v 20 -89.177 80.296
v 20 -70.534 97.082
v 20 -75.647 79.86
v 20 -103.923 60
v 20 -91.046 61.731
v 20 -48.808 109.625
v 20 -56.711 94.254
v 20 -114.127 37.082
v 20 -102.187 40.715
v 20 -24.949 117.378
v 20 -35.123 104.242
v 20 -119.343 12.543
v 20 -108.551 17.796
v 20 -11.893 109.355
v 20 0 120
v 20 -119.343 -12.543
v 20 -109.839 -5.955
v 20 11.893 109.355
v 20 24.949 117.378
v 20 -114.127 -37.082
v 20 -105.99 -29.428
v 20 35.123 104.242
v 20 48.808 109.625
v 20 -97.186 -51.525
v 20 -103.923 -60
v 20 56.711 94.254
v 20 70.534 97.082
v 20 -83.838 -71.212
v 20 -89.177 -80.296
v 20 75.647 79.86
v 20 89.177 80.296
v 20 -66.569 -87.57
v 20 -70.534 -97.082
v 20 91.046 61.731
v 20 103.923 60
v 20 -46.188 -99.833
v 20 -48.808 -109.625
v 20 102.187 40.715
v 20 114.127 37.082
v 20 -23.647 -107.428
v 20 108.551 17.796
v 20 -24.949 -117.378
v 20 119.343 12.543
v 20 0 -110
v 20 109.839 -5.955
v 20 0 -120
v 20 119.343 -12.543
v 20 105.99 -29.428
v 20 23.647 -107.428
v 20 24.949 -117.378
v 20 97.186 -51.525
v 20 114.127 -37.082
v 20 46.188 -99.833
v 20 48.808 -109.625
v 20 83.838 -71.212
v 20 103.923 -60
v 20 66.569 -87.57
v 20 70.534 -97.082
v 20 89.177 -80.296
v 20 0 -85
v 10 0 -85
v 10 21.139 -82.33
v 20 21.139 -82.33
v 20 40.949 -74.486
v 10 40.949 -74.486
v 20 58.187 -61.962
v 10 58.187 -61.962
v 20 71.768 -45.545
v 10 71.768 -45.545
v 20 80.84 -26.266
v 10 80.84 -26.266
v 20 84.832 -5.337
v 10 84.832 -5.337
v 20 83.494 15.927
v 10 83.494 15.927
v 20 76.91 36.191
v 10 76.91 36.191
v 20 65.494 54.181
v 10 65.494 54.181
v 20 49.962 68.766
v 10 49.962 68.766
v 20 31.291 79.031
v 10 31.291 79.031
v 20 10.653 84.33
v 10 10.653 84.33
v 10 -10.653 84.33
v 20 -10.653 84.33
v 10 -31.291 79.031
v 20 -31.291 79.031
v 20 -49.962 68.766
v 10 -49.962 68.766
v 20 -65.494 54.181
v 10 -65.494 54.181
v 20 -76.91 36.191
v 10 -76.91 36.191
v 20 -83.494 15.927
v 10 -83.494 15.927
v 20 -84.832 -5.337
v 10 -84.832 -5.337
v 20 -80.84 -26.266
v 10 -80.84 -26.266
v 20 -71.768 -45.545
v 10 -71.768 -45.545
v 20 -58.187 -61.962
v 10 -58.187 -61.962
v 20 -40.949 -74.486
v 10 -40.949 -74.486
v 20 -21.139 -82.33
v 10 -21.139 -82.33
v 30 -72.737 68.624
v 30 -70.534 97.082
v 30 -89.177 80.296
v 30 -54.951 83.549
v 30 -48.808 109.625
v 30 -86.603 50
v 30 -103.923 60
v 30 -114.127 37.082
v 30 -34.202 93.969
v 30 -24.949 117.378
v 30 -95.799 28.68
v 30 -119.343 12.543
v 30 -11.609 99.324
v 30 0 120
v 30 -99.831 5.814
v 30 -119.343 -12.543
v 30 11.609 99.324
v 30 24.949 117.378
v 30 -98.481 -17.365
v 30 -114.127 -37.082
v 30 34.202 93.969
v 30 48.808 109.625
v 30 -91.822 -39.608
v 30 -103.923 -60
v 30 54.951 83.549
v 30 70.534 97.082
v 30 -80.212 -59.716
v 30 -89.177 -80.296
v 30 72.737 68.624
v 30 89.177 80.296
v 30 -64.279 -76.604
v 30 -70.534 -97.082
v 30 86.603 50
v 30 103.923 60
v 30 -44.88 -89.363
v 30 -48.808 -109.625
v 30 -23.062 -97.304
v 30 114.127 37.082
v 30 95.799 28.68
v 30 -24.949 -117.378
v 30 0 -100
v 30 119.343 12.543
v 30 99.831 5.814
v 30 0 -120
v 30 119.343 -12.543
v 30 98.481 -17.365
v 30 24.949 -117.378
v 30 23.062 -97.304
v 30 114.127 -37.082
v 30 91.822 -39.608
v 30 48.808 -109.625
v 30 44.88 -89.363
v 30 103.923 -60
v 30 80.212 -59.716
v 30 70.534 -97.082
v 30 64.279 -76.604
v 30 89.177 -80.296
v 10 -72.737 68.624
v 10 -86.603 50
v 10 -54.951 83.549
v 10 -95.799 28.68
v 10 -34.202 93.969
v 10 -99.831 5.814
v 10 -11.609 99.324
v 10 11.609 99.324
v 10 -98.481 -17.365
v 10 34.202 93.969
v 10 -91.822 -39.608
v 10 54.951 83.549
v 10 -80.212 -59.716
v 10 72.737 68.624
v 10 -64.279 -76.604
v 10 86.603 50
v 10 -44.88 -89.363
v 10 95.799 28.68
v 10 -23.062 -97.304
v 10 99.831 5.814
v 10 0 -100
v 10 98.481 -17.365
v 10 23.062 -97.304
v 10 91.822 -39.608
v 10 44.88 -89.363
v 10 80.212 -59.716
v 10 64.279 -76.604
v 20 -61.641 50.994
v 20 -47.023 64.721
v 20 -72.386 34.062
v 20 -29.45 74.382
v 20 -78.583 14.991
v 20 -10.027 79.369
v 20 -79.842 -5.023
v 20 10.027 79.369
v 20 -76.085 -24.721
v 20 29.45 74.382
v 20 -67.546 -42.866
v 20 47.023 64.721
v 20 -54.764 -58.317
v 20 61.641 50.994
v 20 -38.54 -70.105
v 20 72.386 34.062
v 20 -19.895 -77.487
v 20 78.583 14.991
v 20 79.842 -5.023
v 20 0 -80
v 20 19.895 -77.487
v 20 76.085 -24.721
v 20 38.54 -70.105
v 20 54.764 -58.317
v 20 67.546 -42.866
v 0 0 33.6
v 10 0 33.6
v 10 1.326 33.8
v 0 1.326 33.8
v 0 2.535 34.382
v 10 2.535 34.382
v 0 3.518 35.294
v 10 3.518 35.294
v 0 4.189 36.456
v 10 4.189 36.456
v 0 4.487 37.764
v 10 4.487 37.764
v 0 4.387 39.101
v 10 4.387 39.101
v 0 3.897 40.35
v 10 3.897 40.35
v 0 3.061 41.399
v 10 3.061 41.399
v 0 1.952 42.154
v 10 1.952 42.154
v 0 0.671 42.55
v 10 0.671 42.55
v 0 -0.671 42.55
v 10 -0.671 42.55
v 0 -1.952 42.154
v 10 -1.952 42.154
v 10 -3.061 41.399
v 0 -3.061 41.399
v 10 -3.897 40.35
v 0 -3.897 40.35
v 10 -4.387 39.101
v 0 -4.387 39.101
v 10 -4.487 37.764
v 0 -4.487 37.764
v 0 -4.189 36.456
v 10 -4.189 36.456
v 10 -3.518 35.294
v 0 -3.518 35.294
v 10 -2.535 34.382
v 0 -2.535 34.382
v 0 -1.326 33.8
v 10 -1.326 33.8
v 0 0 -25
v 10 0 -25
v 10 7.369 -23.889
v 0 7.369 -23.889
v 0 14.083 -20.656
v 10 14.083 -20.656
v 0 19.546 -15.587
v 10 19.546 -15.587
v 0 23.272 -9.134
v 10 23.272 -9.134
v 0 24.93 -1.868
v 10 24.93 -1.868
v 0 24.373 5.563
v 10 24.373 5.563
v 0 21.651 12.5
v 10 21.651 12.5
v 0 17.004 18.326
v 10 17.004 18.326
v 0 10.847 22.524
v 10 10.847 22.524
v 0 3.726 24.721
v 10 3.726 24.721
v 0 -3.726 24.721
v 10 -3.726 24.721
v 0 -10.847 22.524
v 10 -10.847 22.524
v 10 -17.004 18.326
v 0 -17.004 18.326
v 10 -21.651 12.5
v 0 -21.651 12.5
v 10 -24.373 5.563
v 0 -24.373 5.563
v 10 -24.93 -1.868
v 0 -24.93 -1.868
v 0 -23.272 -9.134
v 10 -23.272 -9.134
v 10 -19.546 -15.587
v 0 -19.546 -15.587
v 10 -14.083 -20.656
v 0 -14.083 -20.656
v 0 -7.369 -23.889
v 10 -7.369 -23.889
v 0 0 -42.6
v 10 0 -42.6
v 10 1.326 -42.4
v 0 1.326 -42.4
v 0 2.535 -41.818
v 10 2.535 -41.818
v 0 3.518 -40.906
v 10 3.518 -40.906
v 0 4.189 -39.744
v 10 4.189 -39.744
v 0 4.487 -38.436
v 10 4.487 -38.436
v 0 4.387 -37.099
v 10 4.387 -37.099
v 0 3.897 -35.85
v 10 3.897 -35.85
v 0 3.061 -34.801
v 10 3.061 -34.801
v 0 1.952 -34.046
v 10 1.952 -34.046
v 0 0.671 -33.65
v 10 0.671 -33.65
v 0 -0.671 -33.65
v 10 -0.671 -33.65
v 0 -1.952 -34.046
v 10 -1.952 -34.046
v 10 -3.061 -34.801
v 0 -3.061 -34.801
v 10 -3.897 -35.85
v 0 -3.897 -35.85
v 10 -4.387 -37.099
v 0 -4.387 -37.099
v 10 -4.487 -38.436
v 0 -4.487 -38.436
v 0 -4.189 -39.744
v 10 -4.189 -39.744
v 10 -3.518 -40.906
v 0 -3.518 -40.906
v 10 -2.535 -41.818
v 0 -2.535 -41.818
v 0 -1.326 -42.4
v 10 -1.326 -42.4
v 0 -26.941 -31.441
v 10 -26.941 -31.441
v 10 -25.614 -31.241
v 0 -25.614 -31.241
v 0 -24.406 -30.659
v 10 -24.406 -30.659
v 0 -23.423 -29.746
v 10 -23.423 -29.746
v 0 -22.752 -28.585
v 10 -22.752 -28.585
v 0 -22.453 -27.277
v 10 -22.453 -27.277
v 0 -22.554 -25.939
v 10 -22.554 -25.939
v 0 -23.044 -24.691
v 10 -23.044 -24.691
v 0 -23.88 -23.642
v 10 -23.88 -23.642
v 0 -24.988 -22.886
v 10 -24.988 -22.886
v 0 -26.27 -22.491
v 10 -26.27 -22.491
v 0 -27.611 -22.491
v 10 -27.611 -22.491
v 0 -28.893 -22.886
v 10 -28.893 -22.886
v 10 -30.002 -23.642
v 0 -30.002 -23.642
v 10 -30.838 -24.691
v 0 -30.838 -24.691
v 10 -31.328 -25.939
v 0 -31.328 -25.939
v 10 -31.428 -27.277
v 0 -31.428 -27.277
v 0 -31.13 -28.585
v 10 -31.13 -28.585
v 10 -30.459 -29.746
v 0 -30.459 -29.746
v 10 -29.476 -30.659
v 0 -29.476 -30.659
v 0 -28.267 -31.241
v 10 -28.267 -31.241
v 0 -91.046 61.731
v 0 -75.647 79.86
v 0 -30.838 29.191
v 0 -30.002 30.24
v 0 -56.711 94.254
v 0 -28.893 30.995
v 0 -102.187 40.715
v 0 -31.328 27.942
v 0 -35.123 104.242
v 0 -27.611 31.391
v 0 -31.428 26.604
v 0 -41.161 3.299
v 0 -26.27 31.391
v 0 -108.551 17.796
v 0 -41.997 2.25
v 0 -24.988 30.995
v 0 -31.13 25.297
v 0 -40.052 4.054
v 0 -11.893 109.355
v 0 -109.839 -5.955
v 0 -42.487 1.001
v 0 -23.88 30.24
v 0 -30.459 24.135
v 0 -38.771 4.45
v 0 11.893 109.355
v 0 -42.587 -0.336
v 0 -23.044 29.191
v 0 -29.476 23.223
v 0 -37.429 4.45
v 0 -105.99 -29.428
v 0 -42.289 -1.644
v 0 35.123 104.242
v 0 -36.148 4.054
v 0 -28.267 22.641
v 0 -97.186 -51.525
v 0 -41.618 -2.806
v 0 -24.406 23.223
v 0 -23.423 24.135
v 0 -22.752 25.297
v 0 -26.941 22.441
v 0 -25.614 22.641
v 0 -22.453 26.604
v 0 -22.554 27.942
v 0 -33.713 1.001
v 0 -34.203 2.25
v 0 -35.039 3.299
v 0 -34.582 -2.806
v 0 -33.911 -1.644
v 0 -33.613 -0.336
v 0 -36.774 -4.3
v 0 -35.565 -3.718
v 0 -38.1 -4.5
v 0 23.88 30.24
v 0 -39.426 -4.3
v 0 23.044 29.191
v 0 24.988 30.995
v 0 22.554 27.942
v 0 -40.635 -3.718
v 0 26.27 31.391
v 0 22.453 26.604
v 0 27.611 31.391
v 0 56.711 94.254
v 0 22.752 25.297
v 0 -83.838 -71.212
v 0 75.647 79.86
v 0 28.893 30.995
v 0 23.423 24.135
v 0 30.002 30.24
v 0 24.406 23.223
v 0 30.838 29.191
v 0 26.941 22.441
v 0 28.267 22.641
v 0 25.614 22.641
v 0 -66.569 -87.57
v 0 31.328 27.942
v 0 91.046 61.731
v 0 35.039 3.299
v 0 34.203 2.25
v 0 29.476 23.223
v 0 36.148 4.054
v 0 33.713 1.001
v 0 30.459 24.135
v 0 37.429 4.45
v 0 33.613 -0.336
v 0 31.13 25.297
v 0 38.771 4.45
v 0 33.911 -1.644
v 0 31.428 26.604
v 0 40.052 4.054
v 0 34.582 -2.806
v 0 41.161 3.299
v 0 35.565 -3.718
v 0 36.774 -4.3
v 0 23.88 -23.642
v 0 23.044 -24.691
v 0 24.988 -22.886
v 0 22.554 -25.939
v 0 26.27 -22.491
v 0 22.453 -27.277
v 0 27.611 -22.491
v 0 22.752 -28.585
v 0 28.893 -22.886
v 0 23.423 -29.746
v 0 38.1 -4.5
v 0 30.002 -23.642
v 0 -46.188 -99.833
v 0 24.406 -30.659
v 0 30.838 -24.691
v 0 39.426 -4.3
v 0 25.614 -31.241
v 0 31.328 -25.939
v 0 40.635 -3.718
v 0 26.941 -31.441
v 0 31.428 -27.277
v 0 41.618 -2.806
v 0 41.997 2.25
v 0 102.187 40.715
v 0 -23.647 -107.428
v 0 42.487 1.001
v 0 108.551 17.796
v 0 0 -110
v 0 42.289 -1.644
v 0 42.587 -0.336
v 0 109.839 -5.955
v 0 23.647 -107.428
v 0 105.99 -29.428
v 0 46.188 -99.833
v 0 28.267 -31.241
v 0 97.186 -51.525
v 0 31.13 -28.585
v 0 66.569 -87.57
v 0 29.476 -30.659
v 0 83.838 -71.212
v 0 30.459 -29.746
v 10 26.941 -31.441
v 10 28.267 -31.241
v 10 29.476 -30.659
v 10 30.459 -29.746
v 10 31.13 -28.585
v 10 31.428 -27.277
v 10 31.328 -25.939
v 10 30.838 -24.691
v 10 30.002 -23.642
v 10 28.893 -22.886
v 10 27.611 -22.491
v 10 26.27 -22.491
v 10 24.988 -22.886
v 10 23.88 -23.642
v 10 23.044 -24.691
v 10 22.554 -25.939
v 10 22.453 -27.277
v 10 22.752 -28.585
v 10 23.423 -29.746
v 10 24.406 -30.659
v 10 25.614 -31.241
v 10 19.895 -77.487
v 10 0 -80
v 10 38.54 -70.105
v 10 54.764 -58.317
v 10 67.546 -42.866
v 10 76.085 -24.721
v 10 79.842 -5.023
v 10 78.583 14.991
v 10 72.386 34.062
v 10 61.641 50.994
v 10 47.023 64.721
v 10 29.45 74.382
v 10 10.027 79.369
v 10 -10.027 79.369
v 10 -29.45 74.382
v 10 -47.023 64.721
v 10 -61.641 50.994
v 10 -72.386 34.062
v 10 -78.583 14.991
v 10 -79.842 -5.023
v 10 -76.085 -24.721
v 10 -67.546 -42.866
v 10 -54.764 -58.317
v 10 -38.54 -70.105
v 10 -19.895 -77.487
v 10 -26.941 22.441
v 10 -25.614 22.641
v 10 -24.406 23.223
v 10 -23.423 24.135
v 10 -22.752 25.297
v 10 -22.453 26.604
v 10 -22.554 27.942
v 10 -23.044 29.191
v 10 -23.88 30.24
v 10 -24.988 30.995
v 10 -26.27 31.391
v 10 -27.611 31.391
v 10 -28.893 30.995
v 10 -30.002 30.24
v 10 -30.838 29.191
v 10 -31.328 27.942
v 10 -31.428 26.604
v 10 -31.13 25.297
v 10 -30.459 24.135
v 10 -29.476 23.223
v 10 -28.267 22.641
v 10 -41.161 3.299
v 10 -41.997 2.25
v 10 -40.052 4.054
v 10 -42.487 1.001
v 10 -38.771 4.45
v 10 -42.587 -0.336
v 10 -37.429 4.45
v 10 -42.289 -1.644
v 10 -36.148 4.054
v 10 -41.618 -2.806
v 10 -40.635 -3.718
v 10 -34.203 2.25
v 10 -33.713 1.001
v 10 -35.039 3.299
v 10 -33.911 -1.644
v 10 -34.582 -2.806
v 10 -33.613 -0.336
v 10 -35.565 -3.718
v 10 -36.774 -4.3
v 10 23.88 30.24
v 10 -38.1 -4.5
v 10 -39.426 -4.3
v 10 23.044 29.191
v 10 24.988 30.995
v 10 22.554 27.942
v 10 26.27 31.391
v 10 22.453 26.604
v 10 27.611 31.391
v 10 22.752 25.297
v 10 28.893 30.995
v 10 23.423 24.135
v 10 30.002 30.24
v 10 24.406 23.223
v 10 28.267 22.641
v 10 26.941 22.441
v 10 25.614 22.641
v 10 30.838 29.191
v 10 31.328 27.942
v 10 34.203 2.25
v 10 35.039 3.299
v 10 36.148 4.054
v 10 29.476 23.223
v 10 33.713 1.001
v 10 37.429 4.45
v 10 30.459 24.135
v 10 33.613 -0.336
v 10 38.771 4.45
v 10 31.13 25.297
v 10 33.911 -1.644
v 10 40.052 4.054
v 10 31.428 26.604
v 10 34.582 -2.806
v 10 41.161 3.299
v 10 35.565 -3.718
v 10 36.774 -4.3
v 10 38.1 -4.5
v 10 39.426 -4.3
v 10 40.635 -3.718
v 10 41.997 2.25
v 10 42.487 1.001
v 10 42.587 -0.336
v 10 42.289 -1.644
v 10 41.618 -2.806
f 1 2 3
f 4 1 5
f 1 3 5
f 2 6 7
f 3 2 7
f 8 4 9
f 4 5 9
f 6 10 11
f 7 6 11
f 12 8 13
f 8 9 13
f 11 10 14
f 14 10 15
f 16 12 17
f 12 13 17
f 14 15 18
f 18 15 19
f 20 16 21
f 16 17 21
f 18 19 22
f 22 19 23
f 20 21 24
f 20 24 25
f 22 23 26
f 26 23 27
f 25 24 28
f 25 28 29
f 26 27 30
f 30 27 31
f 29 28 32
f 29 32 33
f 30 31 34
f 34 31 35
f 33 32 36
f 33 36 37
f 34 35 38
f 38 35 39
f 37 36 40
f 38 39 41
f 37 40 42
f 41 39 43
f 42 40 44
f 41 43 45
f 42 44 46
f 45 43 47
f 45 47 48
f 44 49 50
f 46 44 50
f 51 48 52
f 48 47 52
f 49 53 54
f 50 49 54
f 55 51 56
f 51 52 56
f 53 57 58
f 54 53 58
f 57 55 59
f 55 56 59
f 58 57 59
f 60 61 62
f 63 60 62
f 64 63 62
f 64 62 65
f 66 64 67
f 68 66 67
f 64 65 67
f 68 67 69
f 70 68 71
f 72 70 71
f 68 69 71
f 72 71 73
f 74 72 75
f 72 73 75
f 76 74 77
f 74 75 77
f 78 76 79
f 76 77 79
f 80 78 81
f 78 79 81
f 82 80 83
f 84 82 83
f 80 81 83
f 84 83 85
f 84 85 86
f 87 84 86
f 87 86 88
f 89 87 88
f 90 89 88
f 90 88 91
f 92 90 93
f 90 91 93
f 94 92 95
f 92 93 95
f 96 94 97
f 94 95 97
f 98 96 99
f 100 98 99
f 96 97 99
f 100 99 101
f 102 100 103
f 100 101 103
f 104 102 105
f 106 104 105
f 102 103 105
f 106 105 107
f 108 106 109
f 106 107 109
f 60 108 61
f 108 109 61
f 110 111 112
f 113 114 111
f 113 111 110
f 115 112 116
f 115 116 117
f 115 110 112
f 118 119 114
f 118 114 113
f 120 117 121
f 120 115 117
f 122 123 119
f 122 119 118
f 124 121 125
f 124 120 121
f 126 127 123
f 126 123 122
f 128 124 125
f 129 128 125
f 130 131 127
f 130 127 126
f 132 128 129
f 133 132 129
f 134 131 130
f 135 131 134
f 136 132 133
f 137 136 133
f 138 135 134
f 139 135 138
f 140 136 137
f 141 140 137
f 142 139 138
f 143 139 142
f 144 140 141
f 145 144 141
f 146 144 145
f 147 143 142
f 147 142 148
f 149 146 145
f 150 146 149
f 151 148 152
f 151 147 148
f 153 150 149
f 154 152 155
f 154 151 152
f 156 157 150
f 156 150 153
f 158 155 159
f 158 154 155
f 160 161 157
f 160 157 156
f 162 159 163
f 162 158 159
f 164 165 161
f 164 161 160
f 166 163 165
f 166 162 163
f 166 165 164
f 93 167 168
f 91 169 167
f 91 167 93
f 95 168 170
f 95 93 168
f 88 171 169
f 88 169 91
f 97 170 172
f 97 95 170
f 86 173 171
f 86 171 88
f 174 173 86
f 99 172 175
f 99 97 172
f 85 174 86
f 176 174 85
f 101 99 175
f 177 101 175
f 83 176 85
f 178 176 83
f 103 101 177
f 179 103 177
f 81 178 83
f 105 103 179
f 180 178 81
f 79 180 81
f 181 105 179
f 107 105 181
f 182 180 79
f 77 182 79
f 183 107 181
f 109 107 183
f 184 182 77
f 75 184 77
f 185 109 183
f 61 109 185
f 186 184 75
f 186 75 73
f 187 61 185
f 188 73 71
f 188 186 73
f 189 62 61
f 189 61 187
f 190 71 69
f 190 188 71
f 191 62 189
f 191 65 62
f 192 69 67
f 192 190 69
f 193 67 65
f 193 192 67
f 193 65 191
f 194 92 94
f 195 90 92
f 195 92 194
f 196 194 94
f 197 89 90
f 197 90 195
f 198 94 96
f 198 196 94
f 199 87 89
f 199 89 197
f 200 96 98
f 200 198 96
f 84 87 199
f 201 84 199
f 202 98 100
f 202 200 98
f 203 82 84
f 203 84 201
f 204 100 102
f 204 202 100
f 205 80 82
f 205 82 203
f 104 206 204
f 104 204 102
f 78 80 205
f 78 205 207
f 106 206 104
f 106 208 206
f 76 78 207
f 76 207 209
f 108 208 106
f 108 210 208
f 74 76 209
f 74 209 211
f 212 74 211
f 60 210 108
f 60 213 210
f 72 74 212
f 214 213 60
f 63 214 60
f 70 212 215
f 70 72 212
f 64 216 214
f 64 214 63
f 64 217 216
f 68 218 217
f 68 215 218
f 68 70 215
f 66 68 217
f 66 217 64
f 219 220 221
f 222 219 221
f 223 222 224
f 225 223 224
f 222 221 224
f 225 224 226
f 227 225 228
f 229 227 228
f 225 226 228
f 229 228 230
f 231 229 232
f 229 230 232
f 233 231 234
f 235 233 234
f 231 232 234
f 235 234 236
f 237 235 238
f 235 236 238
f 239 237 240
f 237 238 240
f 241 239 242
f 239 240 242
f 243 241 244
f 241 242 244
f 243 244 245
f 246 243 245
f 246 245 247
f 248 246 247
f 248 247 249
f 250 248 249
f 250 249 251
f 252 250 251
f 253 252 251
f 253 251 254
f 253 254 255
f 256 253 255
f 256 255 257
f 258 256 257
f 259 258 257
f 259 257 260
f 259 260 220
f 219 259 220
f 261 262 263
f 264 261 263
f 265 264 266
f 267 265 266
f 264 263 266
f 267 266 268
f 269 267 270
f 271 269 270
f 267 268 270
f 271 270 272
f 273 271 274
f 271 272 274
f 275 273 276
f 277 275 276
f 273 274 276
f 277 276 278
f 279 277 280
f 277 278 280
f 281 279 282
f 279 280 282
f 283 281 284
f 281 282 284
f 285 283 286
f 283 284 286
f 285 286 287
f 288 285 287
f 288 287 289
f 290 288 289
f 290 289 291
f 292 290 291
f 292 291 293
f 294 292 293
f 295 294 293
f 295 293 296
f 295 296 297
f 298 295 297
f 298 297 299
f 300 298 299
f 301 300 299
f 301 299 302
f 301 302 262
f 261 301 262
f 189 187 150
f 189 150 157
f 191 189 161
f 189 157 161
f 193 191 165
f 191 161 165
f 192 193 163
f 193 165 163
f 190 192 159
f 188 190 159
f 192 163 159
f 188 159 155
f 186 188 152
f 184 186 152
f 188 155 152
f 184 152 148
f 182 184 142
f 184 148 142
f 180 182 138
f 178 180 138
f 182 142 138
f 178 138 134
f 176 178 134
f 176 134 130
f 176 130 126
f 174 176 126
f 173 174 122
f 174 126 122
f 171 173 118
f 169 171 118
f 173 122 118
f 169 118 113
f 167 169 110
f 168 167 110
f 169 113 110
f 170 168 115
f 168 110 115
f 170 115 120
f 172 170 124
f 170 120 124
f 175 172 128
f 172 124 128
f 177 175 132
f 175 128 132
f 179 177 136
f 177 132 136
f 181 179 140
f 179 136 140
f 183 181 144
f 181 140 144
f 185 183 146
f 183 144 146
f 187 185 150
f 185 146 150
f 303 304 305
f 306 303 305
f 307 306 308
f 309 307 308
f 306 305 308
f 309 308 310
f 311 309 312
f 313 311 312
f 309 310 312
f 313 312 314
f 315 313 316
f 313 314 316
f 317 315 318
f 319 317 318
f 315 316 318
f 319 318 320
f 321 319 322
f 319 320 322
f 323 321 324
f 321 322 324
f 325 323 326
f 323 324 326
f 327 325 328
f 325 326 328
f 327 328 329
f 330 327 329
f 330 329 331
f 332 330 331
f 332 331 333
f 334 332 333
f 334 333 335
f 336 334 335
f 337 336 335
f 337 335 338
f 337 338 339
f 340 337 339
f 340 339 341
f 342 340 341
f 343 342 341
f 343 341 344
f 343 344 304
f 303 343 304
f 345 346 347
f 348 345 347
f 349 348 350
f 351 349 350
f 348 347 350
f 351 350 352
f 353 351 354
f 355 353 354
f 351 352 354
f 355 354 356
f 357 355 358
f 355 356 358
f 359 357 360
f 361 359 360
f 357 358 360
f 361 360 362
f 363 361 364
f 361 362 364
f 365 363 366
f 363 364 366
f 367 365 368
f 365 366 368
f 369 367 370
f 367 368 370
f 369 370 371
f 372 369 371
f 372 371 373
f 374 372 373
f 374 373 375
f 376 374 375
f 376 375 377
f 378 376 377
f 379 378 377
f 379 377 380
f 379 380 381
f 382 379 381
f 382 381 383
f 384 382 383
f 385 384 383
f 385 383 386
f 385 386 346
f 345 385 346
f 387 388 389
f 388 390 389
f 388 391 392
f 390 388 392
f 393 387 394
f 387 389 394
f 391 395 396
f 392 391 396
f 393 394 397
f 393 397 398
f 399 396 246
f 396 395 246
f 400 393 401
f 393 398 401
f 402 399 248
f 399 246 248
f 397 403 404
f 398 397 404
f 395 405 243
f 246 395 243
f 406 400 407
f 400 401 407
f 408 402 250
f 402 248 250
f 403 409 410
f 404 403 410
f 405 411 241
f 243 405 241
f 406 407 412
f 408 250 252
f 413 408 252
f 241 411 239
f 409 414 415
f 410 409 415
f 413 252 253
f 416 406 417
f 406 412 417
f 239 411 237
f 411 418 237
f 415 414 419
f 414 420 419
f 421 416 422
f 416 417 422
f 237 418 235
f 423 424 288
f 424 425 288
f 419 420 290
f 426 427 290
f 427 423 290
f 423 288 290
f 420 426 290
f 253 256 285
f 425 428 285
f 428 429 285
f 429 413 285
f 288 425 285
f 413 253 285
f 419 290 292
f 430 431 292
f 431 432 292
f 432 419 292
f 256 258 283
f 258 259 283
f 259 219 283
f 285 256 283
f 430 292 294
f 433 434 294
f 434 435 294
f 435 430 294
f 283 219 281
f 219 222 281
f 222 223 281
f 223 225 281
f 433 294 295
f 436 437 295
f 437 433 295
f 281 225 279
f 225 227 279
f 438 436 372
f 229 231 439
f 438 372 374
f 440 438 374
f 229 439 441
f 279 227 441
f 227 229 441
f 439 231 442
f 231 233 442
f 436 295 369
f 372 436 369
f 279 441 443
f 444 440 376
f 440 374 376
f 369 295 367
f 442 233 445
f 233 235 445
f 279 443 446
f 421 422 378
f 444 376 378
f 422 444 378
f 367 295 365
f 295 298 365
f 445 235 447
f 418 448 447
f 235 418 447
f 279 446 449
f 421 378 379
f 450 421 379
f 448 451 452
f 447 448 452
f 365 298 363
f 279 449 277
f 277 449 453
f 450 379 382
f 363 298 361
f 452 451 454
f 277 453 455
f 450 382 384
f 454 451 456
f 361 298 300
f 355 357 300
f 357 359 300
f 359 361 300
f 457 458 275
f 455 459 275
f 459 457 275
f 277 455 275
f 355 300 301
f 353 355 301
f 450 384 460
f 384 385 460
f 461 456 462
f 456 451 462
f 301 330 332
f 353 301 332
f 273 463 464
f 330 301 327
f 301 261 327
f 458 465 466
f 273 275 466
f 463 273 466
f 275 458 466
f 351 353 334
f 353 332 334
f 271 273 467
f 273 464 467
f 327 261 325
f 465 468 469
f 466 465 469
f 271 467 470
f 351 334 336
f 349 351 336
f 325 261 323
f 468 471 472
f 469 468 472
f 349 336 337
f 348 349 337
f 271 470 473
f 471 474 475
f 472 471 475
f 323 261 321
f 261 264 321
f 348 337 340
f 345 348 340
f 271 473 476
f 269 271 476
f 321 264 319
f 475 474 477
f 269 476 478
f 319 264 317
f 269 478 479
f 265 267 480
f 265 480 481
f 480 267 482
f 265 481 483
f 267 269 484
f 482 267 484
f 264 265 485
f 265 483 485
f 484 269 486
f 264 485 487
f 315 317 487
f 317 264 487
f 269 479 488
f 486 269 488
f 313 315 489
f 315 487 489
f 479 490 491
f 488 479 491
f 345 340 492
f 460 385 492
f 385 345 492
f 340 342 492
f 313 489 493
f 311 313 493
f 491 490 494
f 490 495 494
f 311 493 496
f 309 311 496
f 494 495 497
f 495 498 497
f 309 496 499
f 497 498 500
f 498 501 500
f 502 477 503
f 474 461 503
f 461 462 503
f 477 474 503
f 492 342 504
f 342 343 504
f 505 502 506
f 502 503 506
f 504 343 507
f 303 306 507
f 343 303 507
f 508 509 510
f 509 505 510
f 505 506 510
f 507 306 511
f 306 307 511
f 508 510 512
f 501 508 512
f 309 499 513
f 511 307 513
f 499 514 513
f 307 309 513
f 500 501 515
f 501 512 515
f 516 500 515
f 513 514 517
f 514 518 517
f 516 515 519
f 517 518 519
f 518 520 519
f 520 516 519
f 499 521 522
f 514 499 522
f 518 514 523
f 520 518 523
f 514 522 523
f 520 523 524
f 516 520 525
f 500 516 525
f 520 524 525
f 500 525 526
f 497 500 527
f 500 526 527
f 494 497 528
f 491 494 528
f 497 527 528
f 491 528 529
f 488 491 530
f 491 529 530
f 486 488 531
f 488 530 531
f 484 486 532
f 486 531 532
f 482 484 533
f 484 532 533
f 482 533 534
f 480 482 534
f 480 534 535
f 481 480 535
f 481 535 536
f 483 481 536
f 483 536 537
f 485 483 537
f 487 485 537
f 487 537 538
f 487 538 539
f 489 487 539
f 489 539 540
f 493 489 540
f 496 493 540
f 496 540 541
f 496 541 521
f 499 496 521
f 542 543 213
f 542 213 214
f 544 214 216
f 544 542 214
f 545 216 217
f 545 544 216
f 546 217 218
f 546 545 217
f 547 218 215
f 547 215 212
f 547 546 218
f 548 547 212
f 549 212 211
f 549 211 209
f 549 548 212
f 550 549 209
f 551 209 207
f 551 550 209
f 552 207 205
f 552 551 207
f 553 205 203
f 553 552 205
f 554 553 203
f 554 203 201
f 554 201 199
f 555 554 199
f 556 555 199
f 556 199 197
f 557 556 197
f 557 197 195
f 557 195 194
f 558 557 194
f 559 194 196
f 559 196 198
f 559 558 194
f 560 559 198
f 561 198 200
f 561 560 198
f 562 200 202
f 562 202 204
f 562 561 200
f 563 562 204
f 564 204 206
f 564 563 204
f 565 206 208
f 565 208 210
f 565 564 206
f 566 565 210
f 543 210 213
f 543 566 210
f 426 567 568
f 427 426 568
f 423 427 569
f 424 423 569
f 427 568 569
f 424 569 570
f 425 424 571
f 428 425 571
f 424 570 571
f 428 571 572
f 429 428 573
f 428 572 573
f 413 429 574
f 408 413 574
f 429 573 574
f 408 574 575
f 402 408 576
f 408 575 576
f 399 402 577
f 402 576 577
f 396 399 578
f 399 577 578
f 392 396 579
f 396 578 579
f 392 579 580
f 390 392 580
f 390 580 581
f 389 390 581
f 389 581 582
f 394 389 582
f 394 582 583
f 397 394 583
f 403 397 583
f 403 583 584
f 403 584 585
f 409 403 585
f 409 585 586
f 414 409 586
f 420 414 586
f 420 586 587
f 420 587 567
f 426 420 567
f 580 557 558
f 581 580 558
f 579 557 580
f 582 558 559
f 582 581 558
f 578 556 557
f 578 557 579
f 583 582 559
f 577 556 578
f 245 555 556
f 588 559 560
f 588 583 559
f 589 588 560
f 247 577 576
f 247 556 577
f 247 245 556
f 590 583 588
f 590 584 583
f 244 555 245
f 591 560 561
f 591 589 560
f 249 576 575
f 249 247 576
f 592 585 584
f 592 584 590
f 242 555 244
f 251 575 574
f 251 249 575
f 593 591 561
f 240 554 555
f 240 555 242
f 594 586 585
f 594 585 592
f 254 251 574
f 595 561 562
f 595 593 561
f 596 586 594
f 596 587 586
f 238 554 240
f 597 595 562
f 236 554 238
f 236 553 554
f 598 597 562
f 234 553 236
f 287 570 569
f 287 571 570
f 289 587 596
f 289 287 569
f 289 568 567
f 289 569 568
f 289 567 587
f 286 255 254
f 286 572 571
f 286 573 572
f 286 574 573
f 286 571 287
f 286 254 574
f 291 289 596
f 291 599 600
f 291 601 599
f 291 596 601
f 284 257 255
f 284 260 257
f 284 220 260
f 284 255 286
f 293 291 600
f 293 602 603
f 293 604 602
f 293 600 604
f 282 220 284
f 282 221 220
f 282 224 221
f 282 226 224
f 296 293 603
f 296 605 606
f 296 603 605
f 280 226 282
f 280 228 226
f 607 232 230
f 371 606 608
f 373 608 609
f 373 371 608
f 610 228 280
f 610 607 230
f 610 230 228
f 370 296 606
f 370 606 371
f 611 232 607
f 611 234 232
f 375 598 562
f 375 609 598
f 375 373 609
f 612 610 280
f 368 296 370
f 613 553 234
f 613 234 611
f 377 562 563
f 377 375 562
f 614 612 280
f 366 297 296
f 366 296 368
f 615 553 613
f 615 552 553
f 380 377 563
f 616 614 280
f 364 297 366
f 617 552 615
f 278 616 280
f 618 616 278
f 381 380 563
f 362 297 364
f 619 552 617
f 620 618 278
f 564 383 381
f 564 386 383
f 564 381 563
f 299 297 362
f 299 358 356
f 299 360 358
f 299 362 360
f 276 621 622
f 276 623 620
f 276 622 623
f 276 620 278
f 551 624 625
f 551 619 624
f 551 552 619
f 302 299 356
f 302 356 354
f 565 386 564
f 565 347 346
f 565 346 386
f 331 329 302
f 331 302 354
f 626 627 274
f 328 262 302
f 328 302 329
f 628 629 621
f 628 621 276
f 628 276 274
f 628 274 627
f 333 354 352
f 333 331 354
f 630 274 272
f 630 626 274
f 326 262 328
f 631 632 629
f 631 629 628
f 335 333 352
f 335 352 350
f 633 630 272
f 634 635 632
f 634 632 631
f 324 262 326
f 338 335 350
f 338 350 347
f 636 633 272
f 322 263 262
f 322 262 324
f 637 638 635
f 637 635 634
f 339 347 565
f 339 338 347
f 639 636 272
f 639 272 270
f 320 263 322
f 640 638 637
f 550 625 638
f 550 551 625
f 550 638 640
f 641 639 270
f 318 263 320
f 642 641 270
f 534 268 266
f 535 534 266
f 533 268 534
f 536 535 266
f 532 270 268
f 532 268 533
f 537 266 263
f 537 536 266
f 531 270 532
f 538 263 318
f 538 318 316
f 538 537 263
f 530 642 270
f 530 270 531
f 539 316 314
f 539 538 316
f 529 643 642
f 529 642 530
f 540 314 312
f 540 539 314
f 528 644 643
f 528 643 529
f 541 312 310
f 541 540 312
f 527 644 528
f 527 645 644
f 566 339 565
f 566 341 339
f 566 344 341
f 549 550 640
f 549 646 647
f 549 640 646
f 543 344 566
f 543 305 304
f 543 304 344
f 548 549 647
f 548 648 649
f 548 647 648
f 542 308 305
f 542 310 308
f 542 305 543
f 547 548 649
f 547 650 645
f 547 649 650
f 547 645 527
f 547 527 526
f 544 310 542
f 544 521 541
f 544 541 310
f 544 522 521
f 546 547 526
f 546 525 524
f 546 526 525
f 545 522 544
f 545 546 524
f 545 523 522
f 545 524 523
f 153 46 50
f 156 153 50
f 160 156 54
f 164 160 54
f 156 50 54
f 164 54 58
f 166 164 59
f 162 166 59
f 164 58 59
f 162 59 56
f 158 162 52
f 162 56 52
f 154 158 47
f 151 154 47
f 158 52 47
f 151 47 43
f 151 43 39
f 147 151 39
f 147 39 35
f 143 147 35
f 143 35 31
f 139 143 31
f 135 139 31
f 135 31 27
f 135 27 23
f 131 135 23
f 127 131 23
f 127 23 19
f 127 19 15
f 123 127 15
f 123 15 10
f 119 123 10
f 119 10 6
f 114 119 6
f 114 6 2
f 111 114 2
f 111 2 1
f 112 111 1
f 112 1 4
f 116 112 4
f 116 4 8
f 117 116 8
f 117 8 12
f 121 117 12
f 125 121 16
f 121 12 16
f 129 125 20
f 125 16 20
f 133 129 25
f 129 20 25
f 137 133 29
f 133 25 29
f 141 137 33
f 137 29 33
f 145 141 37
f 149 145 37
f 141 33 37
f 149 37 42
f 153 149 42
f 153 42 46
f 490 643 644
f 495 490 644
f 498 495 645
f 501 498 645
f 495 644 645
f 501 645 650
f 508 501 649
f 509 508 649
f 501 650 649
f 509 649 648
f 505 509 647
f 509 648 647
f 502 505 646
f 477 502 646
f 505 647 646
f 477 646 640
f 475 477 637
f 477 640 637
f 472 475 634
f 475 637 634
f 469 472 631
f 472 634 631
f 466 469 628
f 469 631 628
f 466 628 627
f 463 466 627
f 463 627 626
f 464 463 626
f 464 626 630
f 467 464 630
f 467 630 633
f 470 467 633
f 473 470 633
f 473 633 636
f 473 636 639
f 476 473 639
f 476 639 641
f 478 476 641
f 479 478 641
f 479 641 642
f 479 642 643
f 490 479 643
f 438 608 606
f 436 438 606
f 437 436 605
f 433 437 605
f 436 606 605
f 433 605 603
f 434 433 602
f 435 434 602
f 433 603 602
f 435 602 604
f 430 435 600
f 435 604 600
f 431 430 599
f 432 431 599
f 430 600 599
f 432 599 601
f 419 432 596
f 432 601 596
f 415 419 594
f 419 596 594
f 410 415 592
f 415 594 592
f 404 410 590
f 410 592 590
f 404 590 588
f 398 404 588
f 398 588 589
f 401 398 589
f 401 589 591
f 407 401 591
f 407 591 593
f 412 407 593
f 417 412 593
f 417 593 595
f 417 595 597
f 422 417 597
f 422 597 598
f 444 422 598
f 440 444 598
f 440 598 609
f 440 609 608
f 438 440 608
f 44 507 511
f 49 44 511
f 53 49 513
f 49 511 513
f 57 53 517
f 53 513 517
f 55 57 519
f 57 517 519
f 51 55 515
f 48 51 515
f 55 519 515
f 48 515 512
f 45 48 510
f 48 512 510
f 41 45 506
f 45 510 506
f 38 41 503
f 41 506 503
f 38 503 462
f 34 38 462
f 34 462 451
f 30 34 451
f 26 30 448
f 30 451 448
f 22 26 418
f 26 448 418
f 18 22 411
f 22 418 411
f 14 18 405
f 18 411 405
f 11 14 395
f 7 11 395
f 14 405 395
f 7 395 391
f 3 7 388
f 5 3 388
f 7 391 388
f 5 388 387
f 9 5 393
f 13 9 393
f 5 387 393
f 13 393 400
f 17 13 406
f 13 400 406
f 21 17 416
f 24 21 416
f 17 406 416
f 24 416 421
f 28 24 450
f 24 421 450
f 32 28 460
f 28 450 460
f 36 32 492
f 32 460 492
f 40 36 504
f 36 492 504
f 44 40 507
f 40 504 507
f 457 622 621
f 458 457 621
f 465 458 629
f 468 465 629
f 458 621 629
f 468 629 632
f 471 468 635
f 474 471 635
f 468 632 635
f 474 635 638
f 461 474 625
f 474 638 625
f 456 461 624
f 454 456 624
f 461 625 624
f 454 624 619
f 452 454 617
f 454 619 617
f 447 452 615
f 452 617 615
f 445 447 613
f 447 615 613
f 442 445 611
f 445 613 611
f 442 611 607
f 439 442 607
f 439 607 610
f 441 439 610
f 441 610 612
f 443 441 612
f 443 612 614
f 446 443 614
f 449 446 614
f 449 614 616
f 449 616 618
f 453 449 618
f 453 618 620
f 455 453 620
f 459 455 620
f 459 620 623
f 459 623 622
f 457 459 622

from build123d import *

# Parameters (mm, degrees)
SZKIC1_R                    = 120
DODANIE_WYCI_GNI_CIE1_DEPTH = 30
SZKIC2_R                    = 100
WYTNIJ_WYCI_GNI_CIE1_DEPTH  = 20
SZKIC3_R                    = 4.5
WYTNIJ_WYCI_GNI_CIE2_DEPTH  = 171.880074906
SZKIC4_R                    = 25
WYTNIJ_WYCI_GNI_CIE3_DEPTH  = 171.880074906
SZKIC5_R                    = 85
SZKIC5_R_2                  = 80
DODANIE_WYCI_GNI_CIE2_DEPTH = 10
WYTNIJ_WYCI_GNI_CIE4_START  = -30
SZKIC6_R                    = 120
SZKIC6_R_2                  = 110
WYTNIJ_WYCI_GNI_CIE4_DEPTH  = 20


with BuildPart() as part:
    # Szkic1 → Dodanie-wyciągnięcie1 (new body)
    with BuildSketch(Plane(origin=(0, 0, 0), x_dir=(0, 0, -1), z_dir=(1, 0, 0))):
        Circle(SZKIC1_R)
    extrude(amount=DODANIE_WYCI_GNI_CIE1_DEPTH)

    # Szkic2 → Wytnij-wyciągnięcie1 (cut)
    with BuildSketch(Plane(origin=(30, 0, 0), x_dir=(0, 0, -1), z_dir=(1, 0, 0))):
        Circle(SZKIC2_R)
    extrude(amount=-WYTNIJ_WYCI_GNI_CIE1_DEPTH, mode=Mode.SUBTRACT)

    # Szkic3 → Wytnij-wyciągnięcie2 (cut, through all)
    with BuildSketch(Plane(origin=(10, 0, 0), x_dir=(0, 0, -1), z_dir=(1, 0, 0))):
        with Locations((0, 38.1)):
            Circle(SZKIC3_R)
        with Locations((26.940768363, 26.940768363)):
            Circle(SZKIC3_R)
        with Locations((38.1, 0)):
            Circle(SZKIC3_R)
        with Locations((26.940768363, -26.940768363)):
            Circle(SZKIC3_R)
        with Locations((0, -38.1)):
            Circle(SZKIC3_R)
        with Locations((-26.940768363, -26.940768363)):
            Circle(SZKIC3_R)
        with Locations((-38.1, 0)):
            Circle(SZKIC3_R)
        with Locations((-26.940768363, 26.940768363)):
            Circle(SZKIC3_R)
    extrude(amount=-WYTNIJ_WYCI_GNI_CIE2_DEPTH, mode=Mode.SUBTRACT)

    # Szkic4 → Wytnij-wyciągnięcie3 (cut, through all)
    with BuildSketch(Plane(origin=(10, 0, 0), x_dir=(0, 0, -1), z_dir=(1, 0, 0))):
        Circle(SZKIC4_R)
    extrude(amount=-WYTNIJ_WYCI_GNI_CIE3_DEPTH, mode=Mode.SUBTRACT)

    # Szkic5 → Dodanie-wyciągnięcie2 (add)
    with BuildSketch(Plane(origin=(10, 0, 0), x_dir=(0, 0, -1), z_dir=(1, 0, 0))):
        Circle(SZKIC5_R)
        Circle(SZKIC5_R_2, mode=Mode.SUBTRACT)
    extrude(amount=DODANIE_WYCI_GNI_CIE2_DEPTH)

    # Szkic6 → Wytnij-wyciągnięcie4 (cut)
    with BuildSketch(Plane(origin=(30, 0, 0), x_dir=(0, 0, -1), z_dir=(1, 0, 0)).offset(WYTNIJ_WYCI_GNI_CIE4_START)):
        Circle(SZKIC6_R)
        Circle(SZKIC6_R_2, mode=Mode.SUBTRACT)
    extrude(amount=WYTNIJ_WYCI_GNI_CIE4_DEPTH, mode=Mode.SUBTRACT)


solid = part.part
